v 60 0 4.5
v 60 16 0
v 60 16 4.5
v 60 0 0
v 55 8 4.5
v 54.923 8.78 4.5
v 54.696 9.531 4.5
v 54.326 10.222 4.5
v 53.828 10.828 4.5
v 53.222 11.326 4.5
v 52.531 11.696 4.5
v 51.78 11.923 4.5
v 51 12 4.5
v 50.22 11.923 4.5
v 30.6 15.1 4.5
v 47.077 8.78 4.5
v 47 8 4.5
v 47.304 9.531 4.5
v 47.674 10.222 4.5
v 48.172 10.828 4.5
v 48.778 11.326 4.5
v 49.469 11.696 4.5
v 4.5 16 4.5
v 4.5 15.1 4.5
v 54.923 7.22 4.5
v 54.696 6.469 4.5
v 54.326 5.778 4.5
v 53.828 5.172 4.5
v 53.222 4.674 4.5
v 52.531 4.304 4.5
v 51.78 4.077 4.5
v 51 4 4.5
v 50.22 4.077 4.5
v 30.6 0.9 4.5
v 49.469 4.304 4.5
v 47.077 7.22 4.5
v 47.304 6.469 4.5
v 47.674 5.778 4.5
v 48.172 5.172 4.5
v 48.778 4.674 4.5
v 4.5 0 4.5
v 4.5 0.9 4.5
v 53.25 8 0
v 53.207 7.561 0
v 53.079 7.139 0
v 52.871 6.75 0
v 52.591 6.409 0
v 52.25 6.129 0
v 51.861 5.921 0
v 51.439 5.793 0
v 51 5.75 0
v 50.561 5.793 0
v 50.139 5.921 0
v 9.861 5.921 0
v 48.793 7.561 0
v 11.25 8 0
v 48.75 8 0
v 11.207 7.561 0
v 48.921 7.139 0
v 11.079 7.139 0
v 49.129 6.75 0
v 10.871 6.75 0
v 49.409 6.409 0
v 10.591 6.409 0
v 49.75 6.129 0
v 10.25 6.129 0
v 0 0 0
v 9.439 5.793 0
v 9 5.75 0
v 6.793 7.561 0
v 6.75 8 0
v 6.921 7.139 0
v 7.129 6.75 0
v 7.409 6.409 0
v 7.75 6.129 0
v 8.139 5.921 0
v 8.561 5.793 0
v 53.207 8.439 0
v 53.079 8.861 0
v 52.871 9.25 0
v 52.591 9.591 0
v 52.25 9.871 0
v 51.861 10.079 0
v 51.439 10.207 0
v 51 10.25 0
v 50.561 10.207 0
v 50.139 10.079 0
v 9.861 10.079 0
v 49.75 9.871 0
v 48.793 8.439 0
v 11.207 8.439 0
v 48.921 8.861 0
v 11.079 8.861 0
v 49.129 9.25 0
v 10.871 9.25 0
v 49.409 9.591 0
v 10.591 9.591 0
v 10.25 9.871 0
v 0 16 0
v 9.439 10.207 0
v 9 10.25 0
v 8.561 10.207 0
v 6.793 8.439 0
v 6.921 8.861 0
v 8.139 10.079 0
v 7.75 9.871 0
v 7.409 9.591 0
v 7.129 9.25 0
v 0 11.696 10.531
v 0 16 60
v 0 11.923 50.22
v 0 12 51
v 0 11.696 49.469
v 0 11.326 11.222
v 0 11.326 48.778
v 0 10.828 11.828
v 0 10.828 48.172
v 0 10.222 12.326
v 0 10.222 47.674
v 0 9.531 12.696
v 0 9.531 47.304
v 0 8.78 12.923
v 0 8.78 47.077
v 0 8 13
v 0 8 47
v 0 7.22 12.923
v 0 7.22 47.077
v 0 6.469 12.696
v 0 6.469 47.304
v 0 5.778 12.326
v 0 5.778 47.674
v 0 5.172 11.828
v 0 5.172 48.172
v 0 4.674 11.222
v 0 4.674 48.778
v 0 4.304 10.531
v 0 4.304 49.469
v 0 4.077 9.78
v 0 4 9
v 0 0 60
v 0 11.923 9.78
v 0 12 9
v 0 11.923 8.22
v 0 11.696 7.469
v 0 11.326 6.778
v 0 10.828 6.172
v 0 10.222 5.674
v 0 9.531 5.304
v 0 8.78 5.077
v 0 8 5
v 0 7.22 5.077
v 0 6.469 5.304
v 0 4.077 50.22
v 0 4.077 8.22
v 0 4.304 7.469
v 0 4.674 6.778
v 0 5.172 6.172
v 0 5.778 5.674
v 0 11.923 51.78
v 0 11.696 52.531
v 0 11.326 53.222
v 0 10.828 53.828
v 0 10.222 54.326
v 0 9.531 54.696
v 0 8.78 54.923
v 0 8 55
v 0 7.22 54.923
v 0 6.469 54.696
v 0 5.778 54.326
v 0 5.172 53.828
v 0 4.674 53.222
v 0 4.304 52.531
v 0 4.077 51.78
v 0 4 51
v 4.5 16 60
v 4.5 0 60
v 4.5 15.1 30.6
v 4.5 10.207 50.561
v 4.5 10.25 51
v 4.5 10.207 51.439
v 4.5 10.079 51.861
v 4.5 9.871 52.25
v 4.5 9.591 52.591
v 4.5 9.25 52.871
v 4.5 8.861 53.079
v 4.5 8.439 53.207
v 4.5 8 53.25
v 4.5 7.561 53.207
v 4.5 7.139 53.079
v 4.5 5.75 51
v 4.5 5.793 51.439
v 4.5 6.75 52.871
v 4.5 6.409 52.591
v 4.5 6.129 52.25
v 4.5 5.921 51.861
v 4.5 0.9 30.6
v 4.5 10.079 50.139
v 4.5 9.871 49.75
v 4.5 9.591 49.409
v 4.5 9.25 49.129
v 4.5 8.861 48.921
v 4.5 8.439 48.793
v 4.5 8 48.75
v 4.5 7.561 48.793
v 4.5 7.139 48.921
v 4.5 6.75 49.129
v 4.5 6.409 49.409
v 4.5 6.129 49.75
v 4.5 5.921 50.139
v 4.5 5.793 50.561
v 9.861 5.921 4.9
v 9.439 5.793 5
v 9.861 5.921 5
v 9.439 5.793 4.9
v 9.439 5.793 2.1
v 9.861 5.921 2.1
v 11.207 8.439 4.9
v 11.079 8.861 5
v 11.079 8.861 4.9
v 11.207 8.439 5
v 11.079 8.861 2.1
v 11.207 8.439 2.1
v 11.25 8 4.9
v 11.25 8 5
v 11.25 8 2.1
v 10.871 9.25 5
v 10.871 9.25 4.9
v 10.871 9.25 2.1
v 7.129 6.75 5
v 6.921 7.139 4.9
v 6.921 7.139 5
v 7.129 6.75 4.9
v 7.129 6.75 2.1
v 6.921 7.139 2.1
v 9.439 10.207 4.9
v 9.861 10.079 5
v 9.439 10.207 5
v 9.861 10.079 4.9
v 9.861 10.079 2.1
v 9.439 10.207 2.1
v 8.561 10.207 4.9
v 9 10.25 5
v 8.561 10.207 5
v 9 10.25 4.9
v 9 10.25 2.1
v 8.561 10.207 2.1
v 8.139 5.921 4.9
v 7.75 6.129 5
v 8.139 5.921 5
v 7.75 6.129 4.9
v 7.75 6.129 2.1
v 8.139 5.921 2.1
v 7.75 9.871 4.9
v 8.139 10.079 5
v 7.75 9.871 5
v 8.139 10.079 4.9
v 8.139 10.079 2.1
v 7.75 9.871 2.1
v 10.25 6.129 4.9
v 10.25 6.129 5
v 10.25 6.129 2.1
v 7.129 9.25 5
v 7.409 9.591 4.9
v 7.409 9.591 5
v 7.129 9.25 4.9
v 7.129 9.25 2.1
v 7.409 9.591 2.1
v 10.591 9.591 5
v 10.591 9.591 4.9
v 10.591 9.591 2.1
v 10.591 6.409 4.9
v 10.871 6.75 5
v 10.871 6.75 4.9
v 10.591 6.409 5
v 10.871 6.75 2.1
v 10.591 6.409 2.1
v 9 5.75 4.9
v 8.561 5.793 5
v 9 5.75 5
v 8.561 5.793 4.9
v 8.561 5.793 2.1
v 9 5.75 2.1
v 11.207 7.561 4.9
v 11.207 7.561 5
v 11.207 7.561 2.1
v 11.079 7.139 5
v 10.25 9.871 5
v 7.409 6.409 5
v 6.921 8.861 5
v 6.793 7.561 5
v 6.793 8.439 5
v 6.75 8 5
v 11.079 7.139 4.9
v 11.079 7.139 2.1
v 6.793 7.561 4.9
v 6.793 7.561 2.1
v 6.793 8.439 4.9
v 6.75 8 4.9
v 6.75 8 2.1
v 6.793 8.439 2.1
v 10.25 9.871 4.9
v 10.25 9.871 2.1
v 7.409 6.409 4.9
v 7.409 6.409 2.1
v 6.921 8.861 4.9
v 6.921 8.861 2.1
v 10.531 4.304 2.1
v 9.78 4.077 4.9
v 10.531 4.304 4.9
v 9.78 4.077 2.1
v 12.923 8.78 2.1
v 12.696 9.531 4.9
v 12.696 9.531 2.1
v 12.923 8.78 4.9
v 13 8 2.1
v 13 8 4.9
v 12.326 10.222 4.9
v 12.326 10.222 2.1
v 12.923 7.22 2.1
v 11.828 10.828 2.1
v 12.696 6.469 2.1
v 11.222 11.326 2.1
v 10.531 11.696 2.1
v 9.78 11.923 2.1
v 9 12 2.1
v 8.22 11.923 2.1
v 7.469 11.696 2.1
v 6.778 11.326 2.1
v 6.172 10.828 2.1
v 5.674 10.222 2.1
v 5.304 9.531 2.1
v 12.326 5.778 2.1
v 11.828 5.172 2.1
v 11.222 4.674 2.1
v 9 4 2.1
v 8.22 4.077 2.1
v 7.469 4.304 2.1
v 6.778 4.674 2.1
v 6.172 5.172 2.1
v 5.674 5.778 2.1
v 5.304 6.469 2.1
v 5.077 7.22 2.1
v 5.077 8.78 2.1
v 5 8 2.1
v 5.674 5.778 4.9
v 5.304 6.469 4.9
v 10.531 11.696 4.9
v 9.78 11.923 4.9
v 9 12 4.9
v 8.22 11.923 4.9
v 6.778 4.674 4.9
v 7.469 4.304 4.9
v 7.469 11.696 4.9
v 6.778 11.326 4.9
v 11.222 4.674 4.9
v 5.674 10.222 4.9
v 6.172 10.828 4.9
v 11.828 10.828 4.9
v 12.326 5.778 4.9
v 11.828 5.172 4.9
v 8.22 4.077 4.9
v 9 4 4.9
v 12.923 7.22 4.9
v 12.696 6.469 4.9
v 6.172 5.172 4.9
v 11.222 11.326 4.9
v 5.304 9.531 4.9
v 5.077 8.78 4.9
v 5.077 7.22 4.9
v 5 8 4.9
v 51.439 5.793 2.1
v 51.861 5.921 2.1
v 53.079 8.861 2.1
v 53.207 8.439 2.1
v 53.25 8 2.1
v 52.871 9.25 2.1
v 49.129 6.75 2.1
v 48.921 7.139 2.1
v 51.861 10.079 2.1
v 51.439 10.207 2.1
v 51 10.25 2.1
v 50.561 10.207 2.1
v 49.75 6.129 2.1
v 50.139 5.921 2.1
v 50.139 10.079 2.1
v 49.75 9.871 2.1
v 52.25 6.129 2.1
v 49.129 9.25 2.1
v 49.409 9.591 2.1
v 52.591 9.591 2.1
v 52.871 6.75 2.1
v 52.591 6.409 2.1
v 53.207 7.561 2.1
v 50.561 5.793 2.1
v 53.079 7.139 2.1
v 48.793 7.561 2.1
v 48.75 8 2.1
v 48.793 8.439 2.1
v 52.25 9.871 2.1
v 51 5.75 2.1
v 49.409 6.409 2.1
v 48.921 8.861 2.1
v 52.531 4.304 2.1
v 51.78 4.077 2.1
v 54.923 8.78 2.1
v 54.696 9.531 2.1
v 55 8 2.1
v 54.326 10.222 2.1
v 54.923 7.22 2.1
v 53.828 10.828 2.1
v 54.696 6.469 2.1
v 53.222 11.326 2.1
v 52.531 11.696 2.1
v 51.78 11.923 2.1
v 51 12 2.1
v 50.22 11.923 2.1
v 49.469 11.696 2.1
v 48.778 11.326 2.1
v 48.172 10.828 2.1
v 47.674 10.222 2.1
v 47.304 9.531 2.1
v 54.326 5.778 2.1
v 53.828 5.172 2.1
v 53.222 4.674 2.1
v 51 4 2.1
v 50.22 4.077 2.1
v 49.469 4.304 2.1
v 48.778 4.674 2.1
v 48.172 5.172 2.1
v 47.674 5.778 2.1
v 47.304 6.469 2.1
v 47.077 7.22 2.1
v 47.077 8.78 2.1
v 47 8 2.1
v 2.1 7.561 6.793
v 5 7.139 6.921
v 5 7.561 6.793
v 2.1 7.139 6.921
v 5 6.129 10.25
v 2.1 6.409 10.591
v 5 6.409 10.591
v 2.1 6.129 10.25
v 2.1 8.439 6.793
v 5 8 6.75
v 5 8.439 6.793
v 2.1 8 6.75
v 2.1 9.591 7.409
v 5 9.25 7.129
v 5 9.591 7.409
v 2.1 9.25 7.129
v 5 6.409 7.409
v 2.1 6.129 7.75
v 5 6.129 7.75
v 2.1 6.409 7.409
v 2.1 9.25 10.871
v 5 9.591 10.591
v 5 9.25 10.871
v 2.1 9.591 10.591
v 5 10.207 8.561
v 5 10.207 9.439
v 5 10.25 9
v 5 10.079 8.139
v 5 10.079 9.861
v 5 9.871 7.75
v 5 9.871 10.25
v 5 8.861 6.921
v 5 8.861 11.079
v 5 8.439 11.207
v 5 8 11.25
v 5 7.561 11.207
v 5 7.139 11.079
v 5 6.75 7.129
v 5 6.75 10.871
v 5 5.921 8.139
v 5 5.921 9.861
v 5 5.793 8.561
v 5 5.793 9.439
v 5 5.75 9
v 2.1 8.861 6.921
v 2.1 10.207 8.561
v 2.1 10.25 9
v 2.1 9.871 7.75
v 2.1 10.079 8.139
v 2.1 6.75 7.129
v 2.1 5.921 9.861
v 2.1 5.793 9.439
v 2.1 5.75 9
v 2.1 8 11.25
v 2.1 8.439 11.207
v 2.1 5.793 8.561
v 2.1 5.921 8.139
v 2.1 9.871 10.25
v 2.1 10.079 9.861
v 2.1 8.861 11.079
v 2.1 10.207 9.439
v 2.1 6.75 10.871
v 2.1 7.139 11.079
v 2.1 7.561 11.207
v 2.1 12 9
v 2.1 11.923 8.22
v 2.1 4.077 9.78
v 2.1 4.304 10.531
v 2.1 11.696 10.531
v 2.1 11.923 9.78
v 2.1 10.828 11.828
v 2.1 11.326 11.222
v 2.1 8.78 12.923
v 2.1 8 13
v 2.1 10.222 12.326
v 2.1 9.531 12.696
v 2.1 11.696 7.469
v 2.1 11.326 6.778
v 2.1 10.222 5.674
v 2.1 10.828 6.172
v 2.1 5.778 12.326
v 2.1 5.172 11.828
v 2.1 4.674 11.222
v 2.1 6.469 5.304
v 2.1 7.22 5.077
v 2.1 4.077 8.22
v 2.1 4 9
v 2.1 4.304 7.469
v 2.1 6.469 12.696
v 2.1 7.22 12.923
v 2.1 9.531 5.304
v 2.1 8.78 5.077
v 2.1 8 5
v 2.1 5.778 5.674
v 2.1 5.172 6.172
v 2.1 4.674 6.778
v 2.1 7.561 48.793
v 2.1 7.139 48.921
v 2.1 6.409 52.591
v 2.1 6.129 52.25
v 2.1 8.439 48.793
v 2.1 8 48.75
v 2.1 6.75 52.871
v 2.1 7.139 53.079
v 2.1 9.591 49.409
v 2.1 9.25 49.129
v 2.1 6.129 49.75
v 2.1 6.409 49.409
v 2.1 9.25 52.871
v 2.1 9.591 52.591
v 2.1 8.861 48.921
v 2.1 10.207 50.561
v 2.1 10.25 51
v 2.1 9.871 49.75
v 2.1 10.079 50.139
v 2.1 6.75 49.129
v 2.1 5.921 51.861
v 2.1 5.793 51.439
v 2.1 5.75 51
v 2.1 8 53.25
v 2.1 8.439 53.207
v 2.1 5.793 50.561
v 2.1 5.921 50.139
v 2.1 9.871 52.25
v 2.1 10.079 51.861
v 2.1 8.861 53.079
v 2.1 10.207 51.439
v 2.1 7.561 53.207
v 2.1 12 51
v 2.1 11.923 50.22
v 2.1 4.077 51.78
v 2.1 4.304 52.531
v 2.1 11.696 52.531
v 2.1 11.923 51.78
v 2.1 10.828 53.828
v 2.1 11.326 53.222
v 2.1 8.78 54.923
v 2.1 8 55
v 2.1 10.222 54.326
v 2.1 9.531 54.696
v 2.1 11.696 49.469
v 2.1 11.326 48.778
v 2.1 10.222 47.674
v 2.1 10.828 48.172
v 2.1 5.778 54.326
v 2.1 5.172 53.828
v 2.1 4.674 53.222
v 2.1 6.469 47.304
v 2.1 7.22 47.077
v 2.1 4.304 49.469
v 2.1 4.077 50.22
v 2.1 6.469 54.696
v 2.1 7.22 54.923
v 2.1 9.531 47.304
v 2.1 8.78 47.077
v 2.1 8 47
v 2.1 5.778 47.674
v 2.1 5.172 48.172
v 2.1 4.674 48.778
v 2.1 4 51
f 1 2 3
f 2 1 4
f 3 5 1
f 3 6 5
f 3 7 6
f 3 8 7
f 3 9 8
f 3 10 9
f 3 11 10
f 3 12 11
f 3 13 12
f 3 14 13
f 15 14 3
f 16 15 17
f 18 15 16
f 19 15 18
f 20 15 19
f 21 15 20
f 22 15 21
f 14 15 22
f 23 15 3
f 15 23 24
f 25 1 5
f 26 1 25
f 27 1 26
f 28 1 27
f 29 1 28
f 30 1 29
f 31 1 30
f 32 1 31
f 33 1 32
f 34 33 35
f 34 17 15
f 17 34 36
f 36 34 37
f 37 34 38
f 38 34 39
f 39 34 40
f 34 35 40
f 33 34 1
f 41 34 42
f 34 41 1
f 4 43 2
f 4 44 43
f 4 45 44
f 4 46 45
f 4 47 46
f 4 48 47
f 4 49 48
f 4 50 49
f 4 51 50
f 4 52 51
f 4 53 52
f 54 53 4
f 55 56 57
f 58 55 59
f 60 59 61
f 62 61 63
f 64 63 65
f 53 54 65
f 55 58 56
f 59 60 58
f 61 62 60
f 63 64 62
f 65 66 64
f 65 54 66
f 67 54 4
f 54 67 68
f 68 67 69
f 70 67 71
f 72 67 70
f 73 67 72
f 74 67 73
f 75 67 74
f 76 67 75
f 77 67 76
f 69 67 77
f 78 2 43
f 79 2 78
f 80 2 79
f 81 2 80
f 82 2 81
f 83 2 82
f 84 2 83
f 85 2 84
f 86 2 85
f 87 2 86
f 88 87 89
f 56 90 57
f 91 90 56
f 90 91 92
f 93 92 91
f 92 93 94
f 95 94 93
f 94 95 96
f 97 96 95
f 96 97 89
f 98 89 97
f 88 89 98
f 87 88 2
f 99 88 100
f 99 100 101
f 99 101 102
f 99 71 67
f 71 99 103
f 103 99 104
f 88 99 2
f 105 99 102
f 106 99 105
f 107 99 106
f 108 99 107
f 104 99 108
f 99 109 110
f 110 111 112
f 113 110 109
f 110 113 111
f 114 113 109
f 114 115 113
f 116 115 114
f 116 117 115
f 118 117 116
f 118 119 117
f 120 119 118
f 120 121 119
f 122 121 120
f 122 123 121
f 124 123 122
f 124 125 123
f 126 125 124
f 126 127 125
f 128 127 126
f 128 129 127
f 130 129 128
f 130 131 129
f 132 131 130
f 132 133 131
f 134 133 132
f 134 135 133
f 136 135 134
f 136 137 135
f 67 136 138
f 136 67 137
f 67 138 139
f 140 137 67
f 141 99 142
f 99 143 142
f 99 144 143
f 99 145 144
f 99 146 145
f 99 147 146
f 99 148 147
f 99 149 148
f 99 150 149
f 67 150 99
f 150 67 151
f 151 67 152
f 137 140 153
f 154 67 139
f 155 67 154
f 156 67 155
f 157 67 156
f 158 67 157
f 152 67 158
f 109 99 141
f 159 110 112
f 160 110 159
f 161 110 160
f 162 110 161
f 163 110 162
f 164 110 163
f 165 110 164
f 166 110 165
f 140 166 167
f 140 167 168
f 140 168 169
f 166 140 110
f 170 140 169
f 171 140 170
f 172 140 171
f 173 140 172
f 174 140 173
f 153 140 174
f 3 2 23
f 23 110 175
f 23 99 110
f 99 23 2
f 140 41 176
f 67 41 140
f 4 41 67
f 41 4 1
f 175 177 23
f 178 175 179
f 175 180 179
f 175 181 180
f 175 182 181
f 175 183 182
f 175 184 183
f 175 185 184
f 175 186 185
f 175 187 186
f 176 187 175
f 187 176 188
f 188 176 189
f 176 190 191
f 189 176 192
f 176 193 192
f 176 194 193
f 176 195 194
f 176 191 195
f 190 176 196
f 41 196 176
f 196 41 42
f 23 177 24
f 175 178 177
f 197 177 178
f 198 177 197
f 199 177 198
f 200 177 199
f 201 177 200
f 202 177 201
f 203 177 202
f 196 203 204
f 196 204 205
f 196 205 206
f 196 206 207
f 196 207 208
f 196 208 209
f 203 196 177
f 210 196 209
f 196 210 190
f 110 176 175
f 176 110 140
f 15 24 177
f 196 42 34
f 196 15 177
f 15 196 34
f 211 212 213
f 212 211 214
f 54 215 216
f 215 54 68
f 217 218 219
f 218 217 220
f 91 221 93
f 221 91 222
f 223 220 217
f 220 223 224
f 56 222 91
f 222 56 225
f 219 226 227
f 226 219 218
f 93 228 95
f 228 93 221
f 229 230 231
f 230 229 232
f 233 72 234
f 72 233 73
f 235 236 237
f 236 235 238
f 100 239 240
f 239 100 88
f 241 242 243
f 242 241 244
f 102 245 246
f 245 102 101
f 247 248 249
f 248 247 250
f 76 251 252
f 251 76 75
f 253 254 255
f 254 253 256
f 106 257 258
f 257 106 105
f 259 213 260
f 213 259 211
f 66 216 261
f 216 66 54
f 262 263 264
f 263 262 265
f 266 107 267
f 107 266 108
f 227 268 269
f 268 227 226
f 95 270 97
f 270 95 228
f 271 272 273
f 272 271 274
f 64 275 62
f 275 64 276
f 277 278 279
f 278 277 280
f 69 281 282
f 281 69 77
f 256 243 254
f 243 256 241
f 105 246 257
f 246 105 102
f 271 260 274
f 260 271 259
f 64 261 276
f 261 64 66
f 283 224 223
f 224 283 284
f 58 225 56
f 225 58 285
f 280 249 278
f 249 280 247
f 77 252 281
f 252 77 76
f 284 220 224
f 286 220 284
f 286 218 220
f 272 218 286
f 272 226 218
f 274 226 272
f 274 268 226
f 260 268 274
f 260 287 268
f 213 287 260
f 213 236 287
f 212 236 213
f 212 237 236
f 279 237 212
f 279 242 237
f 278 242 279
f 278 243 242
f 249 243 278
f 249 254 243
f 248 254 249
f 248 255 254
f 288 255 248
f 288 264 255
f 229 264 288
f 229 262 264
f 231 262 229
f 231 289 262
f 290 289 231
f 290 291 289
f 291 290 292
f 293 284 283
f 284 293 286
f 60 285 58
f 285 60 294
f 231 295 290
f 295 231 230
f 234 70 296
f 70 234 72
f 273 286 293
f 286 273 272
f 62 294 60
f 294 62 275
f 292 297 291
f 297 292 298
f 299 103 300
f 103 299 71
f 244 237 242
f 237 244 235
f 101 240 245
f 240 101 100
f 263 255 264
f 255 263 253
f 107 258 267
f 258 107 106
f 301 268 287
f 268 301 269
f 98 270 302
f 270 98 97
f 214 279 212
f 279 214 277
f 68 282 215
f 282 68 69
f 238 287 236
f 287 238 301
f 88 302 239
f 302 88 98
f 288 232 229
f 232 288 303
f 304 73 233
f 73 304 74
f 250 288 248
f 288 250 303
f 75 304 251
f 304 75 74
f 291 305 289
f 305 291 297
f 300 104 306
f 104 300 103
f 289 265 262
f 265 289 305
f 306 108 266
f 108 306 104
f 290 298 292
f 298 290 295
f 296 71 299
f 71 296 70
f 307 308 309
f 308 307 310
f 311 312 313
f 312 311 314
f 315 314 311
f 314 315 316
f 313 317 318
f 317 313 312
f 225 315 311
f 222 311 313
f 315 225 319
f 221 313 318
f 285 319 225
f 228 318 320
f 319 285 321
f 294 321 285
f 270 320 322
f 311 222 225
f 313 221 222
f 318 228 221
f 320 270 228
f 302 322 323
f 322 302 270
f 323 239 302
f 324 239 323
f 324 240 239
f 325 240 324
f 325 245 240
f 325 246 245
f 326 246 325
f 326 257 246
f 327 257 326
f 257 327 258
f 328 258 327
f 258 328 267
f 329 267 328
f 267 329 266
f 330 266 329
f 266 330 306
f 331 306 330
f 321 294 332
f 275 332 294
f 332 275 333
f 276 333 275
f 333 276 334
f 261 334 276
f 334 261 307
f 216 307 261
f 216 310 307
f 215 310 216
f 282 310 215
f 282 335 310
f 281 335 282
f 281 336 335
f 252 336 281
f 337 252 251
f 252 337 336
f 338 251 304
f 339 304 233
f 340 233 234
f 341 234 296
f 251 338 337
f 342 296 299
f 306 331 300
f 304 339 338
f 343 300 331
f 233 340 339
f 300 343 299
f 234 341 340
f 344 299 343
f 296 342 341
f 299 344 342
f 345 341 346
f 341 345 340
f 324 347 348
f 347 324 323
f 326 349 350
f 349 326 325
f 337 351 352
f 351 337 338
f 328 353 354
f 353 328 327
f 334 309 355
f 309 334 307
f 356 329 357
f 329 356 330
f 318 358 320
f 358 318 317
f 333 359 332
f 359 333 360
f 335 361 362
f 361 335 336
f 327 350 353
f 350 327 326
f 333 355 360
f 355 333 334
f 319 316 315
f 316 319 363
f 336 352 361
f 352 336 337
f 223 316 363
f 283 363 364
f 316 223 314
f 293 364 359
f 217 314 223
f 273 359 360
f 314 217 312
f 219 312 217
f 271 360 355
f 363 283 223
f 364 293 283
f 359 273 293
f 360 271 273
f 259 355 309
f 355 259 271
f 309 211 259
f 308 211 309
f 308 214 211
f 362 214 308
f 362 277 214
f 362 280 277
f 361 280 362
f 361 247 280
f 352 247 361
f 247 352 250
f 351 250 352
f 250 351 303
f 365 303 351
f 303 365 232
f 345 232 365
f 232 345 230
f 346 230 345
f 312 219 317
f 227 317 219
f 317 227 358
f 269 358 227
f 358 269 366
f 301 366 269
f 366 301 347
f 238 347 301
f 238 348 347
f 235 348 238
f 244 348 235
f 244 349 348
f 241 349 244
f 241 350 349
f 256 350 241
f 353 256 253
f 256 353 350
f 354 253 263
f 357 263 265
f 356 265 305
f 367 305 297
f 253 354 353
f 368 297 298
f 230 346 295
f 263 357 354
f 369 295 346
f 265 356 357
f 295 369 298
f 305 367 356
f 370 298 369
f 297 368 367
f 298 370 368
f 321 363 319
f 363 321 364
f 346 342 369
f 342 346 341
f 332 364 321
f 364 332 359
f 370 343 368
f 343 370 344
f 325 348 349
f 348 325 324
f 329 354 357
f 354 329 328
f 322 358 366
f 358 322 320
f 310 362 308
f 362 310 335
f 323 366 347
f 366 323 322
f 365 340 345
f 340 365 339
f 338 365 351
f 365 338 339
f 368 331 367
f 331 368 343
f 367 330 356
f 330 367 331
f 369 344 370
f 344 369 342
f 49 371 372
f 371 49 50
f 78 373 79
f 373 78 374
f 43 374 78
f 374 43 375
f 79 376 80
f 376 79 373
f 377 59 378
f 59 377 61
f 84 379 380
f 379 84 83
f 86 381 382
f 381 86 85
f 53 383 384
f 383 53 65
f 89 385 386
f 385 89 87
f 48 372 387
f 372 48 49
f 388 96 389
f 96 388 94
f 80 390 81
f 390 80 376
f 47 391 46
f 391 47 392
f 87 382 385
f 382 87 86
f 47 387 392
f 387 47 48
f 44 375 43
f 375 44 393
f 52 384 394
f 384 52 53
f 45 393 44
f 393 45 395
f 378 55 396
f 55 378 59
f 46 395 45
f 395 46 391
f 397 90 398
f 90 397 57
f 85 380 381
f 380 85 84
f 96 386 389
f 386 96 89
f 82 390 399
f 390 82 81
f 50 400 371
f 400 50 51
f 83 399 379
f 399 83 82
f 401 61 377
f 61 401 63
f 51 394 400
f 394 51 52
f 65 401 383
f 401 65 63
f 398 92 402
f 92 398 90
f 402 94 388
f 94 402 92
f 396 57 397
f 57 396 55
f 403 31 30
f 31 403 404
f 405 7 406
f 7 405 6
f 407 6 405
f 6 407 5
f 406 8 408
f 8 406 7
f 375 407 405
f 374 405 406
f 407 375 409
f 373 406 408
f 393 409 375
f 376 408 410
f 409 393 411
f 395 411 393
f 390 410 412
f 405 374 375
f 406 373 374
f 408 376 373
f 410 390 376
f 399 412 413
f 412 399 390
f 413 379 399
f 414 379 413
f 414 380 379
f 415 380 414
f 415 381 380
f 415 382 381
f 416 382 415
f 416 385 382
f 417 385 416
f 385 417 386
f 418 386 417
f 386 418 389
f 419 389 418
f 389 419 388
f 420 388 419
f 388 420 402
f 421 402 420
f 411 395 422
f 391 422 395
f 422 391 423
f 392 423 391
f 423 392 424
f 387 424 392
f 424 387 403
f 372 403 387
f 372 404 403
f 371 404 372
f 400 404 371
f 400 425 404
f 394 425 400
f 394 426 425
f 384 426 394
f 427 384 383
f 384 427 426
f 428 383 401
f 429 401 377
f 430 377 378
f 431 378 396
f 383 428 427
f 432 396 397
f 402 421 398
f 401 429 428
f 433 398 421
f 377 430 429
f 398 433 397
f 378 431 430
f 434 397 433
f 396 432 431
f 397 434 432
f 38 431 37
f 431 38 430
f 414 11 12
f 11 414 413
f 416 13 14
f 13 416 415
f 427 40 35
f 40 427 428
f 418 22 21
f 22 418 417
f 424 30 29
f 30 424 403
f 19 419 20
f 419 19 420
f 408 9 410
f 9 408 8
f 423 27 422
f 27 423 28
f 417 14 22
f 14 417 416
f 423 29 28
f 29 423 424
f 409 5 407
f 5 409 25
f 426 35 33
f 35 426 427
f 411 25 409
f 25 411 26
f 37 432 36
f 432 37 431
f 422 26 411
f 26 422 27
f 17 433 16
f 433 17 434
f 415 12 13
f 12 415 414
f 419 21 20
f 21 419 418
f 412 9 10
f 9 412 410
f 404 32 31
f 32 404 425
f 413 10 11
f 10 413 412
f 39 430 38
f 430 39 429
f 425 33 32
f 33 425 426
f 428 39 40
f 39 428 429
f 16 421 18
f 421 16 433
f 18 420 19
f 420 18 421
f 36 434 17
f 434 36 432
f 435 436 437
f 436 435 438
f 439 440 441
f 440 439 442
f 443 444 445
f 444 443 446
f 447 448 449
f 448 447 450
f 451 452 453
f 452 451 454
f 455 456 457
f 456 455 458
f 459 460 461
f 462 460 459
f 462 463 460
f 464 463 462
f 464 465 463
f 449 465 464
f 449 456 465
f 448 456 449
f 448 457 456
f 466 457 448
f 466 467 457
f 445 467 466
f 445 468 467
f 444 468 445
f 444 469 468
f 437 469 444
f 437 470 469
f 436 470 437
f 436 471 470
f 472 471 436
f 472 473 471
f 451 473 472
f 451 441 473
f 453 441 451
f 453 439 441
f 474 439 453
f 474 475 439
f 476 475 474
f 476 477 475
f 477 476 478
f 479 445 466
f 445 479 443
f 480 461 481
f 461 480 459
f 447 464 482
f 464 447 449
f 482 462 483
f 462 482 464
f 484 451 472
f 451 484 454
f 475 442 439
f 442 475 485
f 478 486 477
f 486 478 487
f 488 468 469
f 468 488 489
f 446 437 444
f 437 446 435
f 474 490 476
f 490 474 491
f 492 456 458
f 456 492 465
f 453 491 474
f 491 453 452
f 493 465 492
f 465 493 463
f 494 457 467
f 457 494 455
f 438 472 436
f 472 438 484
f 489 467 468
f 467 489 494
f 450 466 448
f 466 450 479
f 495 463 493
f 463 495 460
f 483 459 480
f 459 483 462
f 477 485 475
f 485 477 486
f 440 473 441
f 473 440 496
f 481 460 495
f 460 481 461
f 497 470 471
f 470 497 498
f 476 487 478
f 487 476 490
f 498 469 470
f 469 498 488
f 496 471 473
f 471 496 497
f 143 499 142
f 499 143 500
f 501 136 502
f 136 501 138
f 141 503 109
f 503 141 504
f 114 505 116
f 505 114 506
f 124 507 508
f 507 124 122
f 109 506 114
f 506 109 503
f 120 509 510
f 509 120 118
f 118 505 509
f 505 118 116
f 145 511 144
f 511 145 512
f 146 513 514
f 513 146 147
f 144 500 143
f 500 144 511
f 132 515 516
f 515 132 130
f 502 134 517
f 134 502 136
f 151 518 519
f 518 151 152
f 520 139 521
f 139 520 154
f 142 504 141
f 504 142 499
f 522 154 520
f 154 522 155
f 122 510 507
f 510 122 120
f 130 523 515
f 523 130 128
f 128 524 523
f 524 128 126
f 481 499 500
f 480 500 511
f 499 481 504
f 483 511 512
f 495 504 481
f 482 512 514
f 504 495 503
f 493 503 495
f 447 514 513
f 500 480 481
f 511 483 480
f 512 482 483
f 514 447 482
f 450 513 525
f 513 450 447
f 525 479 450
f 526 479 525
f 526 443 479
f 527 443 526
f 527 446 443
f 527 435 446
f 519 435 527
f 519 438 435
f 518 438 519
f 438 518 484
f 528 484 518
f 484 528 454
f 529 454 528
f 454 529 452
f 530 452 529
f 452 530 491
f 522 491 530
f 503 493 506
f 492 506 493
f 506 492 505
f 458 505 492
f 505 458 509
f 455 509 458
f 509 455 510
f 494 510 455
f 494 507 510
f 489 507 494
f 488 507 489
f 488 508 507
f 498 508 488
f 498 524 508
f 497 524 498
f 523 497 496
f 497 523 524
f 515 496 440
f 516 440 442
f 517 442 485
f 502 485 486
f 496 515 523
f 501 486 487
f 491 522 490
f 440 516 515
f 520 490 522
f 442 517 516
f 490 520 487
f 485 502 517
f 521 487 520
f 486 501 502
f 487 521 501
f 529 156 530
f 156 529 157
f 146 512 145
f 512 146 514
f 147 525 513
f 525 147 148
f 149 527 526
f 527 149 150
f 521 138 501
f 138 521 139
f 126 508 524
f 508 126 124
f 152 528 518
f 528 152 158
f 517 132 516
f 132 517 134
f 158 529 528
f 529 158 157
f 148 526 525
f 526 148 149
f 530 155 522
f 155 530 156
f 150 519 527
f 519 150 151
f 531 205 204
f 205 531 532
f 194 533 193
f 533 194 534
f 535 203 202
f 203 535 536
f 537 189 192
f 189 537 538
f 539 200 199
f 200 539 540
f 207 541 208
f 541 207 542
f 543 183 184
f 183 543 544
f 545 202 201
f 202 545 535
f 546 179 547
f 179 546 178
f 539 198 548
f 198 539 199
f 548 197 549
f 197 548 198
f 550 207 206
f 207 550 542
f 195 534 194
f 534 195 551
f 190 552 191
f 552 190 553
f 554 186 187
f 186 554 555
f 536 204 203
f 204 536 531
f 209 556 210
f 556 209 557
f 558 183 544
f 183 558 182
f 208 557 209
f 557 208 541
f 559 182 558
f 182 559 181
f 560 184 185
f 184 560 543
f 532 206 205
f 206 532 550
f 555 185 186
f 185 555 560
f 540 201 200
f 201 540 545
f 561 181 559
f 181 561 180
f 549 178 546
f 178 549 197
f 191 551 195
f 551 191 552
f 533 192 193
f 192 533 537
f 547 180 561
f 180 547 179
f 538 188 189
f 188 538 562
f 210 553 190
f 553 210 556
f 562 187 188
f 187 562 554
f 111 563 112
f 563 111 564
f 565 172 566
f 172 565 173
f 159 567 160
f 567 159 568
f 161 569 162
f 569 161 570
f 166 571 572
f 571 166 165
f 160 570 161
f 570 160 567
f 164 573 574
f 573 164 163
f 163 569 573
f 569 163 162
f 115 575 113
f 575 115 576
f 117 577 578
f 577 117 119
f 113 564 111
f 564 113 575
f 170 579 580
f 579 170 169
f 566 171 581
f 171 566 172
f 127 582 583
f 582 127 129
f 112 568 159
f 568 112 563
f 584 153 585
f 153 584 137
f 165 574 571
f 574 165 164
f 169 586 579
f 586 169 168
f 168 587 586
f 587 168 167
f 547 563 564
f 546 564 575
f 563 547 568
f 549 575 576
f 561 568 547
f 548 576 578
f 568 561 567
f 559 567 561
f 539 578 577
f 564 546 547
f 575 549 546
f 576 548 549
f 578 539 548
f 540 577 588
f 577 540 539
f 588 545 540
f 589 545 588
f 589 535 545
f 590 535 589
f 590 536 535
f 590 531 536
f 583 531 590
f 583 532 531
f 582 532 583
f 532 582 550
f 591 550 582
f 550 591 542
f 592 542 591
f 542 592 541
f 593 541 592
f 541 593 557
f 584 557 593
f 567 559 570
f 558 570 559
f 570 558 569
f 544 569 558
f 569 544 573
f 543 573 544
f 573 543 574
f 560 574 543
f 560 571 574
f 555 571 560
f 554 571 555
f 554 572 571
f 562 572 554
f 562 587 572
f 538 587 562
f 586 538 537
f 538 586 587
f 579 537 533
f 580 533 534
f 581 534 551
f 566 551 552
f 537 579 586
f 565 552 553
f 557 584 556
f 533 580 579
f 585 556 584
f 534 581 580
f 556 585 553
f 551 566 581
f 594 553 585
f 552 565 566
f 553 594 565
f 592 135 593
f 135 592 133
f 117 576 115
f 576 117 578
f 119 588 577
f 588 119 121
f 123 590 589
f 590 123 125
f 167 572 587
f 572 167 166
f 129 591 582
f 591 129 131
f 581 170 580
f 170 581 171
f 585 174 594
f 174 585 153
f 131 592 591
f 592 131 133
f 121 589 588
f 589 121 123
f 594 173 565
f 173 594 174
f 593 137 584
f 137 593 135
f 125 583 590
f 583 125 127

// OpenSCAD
$fn = 32;

// ----------------------------------------------------------------------
// L-bracket: 60 x 16 x 60 mm
// ----------------------------------------------------------------------

// --- parameters (mm) ---
base_len = 60;            // horizontal leg, X
upright_h = 60;           // vertical leg, Z
flange_w = 16;            // bracket depth, Y
mat_t = 4.5;              // plate thickness
hole_d = 4.5;             // clearance for M4
cb_d = 8;                 // counterbore seat
cb_h = 2.4;               // counterbore depth
rib_leg = 34.2;           // gusset leg
rib_sink = 0.9;           // gusset overlap into the plates

module hole_z(px, py) {
  translate([px, py, -0.5]) cylinder(h = mat_t + 1, d = hole_d);
}
module hole_x(pz, py) {
  translate([-0.5, py, pz]) rotate([0, 90, 0]) cylinder(h = mat_t + 1, d = hole_d);
}
module cb_z(px, py) {
  translate([px, py, mat_t - cb_h]) cylinder(h = cb_h + 0.4, d = cb_d);
}
module cb_x(pz, py) {
  translate([mat_t - cb_h, py, pz]) rotate([0, -90, 0]) cylinder(h = cb_h + 0.4, d = cb_d);
}
module gusset() {
  translate([0, flange_w - rib_sink, 0])
    rotate([90, 0, 0])
      linear_extrude(height = flange_w - 2 * rib_sink)
        polygon(points = [[rib_sink, rib_sink], [rib_leg, rib_sink], [rib_sink, rib_leg]]);
}

difference() {
  union() {
    /* horizontal leg */
    cube([base_len, flange_w, mat_t]);
    /* vertical leg, overlapping the corner block */
    cube([mat_t, flange_w, upright_h]);
    gusset();
  }
  hole_z(9, 8);
  cb_z(9, 8);
  hole_z(51, 8);
  cb_z(51, 8);
  hole_x(9, 8);
  cb_x(9, 8);
  hole_x(51, 8);
  cb_x(51, 8);
}
